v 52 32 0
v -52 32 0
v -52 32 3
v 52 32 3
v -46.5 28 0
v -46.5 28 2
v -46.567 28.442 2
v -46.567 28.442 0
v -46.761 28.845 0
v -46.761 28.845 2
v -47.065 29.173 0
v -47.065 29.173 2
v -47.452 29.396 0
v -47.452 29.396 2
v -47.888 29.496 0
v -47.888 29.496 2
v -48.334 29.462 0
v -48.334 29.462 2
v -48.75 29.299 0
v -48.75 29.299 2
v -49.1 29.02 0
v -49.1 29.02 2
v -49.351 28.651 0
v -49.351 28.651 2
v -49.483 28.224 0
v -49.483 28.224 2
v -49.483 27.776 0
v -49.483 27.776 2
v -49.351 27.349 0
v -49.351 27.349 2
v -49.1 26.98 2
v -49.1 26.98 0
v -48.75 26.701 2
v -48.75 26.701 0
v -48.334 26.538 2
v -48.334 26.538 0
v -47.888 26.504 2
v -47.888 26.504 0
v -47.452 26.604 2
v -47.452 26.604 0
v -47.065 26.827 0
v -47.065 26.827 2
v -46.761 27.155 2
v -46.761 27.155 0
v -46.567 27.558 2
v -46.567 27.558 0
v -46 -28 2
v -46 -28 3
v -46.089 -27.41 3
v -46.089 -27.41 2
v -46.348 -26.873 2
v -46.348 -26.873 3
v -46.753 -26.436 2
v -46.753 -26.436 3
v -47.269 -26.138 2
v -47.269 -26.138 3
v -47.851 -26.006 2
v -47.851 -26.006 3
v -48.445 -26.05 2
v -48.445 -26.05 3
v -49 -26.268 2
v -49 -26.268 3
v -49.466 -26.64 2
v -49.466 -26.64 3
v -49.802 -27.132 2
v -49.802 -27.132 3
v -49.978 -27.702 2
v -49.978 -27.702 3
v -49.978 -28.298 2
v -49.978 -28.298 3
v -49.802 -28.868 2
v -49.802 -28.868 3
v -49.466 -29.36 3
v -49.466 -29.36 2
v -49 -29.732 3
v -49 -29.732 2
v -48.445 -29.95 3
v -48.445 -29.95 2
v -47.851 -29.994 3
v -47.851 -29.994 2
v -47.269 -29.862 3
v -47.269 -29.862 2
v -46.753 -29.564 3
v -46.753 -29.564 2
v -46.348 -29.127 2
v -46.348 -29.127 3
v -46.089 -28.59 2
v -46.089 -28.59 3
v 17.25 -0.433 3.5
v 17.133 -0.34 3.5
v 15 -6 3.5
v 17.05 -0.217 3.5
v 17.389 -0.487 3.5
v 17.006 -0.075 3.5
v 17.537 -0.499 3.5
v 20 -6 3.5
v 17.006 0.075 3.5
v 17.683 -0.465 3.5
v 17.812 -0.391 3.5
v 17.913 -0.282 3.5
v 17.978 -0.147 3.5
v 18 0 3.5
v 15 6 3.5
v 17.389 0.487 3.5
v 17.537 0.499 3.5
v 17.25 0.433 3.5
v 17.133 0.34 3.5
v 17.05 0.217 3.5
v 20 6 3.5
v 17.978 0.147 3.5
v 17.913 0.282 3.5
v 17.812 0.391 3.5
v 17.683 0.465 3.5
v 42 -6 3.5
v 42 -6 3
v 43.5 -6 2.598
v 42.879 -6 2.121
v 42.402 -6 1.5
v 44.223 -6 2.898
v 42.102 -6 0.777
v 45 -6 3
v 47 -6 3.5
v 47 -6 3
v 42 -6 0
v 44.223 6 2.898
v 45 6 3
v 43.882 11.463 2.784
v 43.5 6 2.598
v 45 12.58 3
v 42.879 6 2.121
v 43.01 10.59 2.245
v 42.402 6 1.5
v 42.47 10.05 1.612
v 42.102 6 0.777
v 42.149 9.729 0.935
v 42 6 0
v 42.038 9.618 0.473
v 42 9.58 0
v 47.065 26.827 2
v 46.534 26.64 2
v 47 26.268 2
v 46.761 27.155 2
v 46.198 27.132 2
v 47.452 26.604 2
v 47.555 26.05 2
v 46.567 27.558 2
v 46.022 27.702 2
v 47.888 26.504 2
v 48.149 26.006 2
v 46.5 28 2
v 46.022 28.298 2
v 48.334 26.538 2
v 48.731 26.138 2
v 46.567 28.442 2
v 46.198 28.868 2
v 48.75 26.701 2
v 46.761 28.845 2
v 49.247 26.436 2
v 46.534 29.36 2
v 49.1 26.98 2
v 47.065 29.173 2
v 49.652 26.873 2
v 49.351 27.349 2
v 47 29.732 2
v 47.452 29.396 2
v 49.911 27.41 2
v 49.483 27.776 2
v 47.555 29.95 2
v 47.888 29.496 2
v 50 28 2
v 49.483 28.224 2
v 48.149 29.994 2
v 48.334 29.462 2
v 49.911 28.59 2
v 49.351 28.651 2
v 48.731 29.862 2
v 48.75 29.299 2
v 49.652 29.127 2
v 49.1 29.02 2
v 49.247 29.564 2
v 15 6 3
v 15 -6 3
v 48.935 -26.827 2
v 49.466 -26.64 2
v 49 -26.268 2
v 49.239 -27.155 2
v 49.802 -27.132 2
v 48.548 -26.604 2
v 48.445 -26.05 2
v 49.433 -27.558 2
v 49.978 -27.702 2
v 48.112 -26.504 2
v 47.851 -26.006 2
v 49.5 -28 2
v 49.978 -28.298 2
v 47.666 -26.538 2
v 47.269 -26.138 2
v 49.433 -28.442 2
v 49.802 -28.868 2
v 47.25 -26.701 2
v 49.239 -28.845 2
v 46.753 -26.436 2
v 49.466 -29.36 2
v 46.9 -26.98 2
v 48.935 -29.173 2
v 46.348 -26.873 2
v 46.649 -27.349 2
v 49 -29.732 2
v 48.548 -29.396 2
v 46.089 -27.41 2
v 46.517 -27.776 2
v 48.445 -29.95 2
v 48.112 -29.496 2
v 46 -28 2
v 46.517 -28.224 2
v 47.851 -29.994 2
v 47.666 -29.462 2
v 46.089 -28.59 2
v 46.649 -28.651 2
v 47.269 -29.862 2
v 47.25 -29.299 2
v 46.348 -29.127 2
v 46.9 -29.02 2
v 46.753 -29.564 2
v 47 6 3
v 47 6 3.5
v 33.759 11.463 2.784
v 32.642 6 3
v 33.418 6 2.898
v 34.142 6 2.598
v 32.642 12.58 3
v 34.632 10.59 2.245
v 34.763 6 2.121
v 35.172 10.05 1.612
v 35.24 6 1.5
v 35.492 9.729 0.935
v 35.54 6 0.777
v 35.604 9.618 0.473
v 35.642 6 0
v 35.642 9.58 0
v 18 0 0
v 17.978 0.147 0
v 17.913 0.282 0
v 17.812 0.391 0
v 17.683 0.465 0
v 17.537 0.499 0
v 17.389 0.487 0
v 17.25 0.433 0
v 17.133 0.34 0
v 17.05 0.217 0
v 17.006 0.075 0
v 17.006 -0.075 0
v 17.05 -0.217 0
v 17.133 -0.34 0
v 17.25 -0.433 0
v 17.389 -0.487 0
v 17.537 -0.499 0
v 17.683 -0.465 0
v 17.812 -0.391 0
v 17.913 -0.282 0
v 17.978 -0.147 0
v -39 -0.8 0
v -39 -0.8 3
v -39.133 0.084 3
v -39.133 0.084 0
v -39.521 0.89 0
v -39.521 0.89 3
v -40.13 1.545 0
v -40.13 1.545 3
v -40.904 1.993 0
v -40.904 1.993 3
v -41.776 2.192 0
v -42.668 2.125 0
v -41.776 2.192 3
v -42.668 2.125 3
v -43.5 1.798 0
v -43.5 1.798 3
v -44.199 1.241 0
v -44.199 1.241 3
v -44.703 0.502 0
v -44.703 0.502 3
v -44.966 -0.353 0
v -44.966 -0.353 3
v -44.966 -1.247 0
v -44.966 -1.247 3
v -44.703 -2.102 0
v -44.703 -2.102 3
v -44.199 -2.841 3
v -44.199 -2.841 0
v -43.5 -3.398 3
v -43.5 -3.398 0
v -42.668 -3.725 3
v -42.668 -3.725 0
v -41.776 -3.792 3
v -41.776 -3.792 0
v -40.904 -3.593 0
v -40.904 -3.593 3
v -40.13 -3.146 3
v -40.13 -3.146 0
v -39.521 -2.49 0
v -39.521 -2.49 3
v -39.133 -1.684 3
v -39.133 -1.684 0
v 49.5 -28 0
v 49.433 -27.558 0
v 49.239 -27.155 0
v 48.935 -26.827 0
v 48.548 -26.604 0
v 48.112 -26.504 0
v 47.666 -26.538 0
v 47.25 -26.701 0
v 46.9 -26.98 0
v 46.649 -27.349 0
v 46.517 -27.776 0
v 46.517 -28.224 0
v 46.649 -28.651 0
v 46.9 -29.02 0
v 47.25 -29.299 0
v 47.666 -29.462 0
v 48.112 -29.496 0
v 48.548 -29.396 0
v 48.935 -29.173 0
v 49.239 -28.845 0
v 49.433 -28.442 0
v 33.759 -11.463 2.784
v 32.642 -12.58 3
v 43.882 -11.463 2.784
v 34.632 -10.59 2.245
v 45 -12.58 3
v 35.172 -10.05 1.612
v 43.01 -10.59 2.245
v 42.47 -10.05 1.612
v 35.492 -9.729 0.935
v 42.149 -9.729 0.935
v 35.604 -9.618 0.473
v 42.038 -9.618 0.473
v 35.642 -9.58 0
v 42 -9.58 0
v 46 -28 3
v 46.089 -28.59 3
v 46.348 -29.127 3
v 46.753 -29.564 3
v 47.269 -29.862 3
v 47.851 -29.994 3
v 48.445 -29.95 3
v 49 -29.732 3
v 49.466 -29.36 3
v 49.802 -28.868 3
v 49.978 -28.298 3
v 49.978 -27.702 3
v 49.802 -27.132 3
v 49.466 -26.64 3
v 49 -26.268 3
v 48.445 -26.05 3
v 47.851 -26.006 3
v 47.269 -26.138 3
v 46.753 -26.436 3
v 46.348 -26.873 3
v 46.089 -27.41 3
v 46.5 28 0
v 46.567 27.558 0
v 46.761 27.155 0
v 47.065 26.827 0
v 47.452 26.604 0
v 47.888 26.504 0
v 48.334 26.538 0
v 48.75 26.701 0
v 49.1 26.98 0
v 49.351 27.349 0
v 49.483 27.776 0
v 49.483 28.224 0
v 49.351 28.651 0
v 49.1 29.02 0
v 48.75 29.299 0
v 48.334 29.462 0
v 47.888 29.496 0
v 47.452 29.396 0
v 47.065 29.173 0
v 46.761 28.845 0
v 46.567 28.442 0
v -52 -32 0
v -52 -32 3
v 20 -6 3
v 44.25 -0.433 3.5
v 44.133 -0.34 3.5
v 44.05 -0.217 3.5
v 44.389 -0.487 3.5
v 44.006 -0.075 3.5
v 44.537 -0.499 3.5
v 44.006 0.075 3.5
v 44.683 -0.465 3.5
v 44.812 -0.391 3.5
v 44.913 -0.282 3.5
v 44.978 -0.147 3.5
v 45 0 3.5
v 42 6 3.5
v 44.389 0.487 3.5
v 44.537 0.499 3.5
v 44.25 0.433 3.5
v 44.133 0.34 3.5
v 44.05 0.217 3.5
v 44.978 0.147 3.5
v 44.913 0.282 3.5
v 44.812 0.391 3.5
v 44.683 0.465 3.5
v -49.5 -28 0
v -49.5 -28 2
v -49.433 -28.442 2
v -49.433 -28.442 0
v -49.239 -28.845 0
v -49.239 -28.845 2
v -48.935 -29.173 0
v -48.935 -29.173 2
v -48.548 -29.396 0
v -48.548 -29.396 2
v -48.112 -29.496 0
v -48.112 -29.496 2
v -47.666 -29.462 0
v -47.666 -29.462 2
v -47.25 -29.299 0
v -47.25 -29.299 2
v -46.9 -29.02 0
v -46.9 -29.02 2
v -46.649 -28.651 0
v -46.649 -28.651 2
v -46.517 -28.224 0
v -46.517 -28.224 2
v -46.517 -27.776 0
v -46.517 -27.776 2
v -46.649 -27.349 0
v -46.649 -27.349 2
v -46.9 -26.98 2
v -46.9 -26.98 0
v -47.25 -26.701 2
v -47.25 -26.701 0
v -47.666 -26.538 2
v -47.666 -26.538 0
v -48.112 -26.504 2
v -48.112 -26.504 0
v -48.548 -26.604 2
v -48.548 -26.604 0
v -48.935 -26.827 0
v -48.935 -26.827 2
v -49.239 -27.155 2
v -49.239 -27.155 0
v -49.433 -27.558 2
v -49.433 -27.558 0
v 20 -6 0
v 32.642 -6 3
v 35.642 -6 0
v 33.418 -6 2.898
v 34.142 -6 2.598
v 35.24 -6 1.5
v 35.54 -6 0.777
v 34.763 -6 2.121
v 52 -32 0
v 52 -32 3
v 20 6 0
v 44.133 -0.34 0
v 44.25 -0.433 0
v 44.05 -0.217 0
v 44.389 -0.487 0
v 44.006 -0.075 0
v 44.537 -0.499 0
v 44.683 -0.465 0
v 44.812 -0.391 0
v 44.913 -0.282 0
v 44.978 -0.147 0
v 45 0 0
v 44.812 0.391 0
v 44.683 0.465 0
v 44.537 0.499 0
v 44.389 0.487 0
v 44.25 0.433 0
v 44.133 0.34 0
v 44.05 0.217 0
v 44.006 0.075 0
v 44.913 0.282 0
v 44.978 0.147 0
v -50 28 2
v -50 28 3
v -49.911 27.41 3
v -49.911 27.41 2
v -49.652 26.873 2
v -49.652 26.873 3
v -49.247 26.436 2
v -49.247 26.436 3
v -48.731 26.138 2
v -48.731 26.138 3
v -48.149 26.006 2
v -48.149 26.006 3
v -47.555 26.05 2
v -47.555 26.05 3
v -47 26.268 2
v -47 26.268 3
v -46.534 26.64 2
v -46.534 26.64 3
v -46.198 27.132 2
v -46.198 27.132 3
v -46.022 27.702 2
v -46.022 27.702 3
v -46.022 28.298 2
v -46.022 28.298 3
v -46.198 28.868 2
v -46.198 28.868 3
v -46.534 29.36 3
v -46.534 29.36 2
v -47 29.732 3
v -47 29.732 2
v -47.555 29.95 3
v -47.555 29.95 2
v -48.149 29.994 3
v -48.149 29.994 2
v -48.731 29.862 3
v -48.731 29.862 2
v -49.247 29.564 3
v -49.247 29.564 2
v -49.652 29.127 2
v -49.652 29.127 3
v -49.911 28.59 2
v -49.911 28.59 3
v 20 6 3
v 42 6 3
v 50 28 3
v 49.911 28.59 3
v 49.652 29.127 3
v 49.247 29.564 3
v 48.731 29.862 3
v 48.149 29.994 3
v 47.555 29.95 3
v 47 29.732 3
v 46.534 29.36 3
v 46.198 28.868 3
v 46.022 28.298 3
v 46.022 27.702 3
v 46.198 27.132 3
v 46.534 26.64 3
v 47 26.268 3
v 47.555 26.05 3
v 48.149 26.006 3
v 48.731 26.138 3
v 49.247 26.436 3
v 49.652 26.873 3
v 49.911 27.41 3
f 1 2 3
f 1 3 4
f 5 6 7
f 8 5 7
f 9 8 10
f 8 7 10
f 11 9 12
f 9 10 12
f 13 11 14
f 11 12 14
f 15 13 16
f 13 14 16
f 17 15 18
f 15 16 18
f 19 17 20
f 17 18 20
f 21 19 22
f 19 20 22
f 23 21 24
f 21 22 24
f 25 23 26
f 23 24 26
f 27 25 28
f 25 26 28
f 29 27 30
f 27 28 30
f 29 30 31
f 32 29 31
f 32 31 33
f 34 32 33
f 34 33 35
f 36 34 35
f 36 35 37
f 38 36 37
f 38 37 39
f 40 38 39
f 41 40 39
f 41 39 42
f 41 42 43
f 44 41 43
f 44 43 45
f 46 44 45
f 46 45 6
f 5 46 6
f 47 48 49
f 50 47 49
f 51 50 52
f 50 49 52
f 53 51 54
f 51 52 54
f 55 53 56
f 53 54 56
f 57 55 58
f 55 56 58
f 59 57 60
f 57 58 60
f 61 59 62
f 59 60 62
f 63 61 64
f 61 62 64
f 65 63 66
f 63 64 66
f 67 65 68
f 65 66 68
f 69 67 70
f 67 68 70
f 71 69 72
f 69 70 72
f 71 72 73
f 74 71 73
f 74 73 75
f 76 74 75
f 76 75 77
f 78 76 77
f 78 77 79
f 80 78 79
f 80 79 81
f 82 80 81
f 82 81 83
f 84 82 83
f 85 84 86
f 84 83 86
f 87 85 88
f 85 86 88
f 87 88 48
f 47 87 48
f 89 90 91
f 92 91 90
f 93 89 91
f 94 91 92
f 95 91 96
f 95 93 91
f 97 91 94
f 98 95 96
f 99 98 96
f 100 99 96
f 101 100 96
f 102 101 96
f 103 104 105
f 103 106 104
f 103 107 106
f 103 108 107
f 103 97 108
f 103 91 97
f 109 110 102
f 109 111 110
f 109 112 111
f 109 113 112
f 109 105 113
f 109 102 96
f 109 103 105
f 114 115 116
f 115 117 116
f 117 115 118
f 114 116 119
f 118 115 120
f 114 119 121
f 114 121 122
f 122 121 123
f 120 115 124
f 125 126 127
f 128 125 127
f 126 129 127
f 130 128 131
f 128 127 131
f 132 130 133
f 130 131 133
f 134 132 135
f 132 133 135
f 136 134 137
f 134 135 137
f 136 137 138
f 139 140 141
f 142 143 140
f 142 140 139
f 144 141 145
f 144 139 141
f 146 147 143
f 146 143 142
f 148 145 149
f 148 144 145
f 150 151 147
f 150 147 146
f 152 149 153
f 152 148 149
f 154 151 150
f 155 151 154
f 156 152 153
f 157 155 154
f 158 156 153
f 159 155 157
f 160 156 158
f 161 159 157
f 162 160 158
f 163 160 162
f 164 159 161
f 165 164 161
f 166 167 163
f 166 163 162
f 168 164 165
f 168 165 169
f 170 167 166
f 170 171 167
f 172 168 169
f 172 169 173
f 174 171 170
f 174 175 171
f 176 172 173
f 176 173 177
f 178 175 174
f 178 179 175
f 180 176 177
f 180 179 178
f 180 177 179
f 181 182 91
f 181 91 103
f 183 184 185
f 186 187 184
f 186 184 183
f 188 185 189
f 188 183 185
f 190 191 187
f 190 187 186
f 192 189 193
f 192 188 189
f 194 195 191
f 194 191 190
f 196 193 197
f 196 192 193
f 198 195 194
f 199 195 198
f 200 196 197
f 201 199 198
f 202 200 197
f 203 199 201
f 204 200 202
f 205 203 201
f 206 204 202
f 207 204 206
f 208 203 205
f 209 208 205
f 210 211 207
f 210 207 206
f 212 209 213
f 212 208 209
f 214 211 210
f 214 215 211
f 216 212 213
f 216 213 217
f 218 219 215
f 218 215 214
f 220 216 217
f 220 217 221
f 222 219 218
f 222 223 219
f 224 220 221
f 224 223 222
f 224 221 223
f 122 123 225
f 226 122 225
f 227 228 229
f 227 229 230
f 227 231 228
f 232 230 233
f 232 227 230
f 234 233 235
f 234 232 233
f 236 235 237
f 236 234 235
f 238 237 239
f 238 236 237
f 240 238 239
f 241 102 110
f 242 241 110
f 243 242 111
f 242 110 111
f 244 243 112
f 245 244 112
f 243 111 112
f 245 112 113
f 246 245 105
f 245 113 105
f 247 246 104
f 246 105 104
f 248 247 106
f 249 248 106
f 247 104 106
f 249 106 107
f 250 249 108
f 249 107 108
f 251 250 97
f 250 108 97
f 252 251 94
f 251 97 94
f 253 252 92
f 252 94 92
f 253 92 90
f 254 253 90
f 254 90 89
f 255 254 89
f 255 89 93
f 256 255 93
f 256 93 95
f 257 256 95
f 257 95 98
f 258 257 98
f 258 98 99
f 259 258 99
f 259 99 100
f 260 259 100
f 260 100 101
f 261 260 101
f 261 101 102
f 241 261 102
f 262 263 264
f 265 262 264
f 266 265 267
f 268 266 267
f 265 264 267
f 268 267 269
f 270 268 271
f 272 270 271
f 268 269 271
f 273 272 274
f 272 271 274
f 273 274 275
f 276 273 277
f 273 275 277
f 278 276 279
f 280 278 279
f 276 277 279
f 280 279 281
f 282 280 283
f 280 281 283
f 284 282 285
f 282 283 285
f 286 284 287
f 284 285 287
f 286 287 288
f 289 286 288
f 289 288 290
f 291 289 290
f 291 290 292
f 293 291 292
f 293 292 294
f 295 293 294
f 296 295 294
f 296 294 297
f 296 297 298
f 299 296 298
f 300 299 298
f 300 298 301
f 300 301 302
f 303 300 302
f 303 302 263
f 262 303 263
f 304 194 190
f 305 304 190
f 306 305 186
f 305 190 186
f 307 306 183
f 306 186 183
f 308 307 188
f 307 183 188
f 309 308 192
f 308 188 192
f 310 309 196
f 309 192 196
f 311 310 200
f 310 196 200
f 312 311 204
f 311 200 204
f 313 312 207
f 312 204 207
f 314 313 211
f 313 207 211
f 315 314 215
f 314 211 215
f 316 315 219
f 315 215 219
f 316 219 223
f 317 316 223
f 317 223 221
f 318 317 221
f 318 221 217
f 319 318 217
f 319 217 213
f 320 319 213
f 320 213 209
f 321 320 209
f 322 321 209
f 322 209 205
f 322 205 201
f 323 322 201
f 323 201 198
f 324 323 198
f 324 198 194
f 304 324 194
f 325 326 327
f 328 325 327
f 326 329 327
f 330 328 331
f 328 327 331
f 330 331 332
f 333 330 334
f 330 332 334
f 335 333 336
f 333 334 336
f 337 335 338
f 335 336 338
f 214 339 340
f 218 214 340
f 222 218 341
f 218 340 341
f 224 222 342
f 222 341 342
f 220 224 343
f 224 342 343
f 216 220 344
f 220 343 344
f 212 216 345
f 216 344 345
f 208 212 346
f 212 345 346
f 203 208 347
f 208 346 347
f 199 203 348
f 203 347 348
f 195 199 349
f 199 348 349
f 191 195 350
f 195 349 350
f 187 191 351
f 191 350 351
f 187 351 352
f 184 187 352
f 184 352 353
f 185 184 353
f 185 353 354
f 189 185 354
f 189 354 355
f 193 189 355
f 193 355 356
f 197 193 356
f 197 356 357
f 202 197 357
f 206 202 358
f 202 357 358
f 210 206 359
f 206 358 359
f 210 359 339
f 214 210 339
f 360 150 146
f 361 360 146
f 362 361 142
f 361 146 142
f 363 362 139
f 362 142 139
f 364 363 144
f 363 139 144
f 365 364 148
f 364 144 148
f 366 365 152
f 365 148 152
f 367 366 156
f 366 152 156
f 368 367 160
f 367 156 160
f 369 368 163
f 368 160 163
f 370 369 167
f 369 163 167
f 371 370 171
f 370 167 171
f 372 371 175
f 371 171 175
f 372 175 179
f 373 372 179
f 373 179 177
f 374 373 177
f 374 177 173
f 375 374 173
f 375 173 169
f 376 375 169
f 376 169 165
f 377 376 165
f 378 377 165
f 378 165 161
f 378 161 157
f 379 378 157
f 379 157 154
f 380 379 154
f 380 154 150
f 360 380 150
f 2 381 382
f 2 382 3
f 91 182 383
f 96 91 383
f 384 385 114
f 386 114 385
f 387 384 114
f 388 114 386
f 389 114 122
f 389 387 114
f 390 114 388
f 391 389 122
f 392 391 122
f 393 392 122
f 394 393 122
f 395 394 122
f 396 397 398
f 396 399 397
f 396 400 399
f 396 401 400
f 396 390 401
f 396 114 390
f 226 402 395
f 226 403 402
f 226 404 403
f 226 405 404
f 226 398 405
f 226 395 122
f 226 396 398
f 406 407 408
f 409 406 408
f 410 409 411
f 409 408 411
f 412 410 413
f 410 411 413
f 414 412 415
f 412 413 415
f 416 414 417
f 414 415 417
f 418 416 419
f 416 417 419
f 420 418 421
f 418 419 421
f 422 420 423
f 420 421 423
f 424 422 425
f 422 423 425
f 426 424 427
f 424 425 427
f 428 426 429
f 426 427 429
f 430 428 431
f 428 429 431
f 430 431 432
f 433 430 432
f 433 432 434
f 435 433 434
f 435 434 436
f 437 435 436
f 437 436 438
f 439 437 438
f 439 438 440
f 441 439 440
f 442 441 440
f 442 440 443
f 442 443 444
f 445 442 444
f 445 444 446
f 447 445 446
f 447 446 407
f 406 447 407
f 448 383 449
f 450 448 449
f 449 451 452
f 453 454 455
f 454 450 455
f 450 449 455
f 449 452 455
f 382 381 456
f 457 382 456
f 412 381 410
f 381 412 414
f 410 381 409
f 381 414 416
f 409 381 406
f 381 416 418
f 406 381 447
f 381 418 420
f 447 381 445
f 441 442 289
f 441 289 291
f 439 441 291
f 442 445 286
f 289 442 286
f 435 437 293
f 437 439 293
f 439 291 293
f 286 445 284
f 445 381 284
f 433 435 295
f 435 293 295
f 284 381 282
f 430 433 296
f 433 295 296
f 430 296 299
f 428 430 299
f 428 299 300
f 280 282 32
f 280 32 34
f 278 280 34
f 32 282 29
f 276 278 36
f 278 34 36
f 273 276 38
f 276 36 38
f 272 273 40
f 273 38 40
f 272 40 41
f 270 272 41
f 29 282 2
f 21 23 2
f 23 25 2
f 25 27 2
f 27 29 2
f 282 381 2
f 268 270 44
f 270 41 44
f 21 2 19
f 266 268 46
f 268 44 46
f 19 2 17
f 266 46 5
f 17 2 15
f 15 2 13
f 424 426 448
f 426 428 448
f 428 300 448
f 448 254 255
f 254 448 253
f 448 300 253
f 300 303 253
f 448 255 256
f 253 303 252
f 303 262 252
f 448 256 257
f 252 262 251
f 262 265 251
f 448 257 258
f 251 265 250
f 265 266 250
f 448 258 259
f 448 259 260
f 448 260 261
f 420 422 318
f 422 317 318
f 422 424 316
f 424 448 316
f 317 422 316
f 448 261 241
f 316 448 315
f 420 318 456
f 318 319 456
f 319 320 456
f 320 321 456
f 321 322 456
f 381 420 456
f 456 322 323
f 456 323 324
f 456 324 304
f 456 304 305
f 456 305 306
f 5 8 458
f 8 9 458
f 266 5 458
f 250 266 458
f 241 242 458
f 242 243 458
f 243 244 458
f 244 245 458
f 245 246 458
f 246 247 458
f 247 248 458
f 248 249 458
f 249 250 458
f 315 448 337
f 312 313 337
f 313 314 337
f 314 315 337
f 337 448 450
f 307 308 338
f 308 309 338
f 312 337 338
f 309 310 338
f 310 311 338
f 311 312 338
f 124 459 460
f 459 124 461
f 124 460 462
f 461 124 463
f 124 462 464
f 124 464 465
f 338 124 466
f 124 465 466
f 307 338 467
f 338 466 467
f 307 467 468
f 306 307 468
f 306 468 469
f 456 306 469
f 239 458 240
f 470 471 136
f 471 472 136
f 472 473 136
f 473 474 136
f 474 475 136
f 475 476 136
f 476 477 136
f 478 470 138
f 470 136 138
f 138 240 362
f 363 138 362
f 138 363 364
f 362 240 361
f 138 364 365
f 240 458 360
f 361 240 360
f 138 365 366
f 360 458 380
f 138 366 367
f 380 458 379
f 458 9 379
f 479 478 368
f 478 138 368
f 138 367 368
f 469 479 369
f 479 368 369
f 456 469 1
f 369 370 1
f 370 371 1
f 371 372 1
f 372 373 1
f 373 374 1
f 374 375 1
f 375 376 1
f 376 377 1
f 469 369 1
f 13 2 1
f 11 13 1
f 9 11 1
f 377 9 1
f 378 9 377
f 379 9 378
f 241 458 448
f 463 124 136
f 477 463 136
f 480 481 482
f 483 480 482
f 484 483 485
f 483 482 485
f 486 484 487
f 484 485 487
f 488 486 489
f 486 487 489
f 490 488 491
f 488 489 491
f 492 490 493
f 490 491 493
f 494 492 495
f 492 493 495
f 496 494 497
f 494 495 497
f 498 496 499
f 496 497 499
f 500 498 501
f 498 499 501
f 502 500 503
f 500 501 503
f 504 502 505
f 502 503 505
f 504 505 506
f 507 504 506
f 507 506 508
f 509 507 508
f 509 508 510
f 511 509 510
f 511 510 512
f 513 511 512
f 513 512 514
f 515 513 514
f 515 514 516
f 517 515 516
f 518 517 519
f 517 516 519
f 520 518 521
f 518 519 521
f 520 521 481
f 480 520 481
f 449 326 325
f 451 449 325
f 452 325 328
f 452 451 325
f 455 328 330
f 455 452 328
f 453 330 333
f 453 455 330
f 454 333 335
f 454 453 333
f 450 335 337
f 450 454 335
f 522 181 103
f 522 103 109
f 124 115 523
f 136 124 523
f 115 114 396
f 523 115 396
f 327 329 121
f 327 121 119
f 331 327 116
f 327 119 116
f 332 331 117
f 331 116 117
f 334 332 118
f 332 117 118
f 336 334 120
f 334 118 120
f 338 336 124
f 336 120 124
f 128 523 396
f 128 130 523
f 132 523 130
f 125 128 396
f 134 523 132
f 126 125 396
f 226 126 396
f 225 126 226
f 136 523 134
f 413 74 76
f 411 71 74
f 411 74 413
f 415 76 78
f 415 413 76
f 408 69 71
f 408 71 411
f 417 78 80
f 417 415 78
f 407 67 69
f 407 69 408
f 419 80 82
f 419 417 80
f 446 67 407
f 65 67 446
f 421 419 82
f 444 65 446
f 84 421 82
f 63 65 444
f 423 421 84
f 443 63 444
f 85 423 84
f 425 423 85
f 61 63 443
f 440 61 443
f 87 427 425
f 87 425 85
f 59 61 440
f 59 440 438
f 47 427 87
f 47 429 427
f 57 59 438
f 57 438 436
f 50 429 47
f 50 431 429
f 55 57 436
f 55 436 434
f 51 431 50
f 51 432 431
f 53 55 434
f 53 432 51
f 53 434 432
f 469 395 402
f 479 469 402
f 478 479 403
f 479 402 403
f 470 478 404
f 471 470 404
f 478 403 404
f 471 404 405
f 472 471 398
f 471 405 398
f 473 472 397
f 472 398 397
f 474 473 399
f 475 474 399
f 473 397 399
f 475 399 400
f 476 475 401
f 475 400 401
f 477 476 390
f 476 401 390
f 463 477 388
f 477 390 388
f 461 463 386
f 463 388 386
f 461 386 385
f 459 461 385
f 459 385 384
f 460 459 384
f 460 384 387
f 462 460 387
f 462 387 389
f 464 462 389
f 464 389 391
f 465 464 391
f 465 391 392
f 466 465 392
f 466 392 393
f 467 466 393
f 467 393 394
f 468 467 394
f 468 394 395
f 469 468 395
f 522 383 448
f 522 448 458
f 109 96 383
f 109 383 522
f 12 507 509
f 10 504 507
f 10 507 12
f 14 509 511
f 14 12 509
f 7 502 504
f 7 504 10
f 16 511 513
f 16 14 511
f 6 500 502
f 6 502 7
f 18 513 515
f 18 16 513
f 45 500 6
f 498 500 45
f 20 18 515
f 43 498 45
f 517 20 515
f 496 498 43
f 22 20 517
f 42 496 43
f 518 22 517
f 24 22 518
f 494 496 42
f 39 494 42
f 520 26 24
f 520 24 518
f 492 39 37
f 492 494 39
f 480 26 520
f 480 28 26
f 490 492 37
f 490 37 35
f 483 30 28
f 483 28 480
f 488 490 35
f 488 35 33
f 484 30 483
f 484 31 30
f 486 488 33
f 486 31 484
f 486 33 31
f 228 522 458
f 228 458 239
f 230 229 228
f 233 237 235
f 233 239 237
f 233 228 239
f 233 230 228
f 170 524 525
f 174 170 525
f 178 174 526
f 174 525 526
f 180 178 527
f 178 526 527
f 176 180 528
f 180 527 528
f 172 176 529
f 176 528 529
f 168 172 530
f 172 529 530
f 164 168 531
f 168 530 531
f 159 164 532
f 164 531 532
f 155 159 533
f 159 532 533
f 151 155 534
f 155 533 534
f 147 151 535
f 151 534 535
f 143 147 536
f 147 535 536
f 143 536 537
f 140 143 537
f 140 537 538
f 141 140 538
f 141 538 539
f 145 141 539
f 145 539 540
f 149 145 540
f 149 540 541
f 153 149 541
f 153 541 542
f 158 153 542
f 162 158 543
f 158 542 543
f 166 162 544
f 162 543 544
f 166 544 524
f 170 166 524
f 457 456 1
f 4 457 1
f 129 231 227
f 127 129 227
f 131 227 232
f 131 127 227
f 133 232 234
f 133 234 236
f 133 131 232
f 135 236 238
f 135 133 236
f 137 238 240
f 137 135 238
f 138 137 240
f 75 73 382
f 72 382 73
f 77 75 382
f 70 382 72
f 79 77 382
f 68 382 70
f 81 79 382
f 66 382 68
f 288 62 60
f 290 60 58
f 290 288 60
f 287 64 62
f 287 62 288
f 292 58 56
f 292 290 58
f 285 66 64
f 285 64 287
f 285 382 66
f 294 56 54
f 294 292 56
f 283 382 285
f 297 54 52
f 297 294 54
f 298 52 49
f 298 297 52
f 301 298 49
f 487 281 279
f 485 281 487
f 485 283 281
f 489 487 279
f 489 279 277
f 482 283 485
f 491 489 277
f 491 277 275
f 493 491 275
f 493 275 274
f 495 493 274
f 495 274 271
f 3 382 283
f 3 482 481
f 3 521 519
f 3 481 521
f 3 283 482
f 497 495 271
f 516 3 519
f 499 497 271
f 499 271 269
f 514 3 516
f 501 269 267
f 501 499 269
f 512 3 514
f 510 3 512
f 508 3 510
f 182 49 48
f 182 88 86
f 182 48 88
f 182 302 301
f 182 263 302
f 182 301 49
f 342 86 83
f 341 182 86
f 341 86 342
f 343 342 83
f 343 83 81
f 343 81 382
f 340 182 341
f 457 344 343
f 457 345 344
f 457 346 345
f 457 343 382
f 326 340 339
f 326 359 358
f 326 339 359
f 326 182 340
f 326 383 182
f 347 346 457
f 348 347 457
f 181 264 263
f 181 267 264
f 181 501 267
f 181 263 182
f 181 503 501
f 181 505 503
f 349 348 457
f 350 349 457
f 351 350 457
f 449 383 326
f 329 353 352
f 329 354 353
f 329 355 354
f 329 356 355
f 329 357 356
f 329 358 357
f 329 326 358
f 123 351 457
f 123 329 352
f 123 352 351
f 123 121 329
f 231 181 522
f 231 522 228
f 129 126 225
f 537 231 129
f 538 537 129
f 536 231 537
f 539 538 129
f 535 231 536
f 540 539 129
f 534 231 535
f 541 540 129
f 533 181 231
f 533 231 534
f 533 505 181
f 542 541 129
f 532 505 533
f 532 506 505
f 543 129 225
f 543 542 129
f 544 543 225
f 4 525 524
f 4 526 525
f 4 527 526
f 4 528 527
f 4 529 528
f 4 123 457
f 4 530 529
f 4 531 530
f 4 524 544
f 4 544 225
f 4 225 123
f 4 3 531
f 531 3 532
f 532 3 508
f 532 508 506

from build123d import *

# Parameters (mm, degrees)
SKETCH_1_W           = 104
SKETCH_1_H           = 64
EXTRUDE_1_DEPTH      = 3
SKETCH_2_R           = 1.5
CUT_EXTRUDE_1_DEPTH  = 62.131006862
SKETCH_4_R           = 2
CUT_EXTRUDE_3_DEPTH  = 1
SKETCH_12_W          = 5
SKETCH_12_H          = 12
EXTRUDE_4_DEPTH      = 0.5
SKETCH_13_R          = 0.5
CUT_EXTRUDE_8_DEPTH  = 62.15758334
SKETCH_15_W          = 22
SKETCH_15_H          = 12
CUT_EXTRUDE_10_DEPTH = 62.131006862
SKETCH_17_W          = 6.358168499
SKETCH_17_H          = 19.16029301
CUT_EXTRUDE_11_DEPTH = 4
FILLET_2_R           = 3
SKETCH_18_R          = 3
CUT_EXTRUDE_12_DEPTH = 6


with BuildPart() as part:
    # 草图1 → 凸台-拉伸1 (new body)
    with BuildSketch(Plane.XY):
        Rectangle(SKETCH_1_W, SKETCH_1_H)
    extrude(amount=EXTRUDE_1_DEPTH)

    # 草图2 → 切除-拉伸1 (cut, through all)
    with BuildSketch(Plane.XY.offset(3)):
        with Locations((-48, 28)):
            Circle(SKETCH_2_R)
        with Locations(Location((48, 28, 0), (0, 0, 180))):
            Circle(SKETCH_2_R)
        with Locations((48, -28)):
            Circle(SKETCH_2_R)
        with Locations(Location((-48, -28, 0), (0, 0, 180))):
            Circle(SKETCH_2_R)
    extrude(amount=-CUT_EXTRUDE_1_DEPTH, mode=Mode.SUBTRACT)

    # 草图4 → 切除-拉伸3 (cut)
    with BuildSketch(Plane.XY.offset(3)):
        with Locations((48, 28)):
            Circle(SKETCH_4_R)
        with Locations(Location((-48, 28, 0), (0, 0, 180))):
            Circle(SKETCH_4_R)
        with Locations((-48, -28)):
            Circle(SKETCH_4_R)
        with Locations(Location((48, -28, 0), (0, 0, 180))):
            Circle(SKETCH_4_R)
    extrude(amount=-CUT_EXTRUDE_3_DEPTH, mode=Mode.SUBTRACT)

    # 草图12 → 凸台-拉伸4 (add)
    with BuildSketch(Plane.XY.offset(3)):
        with Locations((17.5, 0)):
            Rectangle(SKETCH_12_W, SKETCH_12_H)
        with Locations((44.5, 0)):
            Rectangle(SKETCH_12_W, SKETCH_12_H)
    extrude(amount=EXTRUDE_4_DEPTH)

    # 草图13 → 切除-拉伸8 (cut, through all)
    with BuildSketch(Plane.XY.offset(3.5)):
        with Locations((17.5, 0)):
            Circle(SKETCH_13_R)
        with Locations((44.5, 0)):
            Circle(SKETCH_13_R)
    extrude(amount=-CUT_EXTRUDE_8_DEPTH, mode=Mode.SUBTRACT)

    # 草图15 → 切除-拉伸10 (cut, through all)
    with BuildSketch(Plane.XY.offset(3)):
        with Locations((31, 0)):
            Rectangle(SKETCH_15_W, SKETCH_15_H)
    extrude(amount=-CUT_EXTRUDE_10_DEPTH, mode=Mode.SUBTRACT)

    # 草图17 → 切除-拉伸11 (cut)
    with BuildSketch(Plane.XY.offset(3)):
        with Locations((38.820915751, 0)):
            Rectangle(SKETCH_17_W, SKETCH_17_H)
    extrude(amount=-CUT_EXTRUDE_11_DEPTH, mode=Mode.SUBTRACT)

    # 圆角2
    fillet_2_edges = [part.edges().sort_by_distance(p)[0] for p in [
        (35.641831501, -7.790073253, 3),
        (38.82091575, -9.580146505, 3),
        (42, -7.790073253, 3),
        (42, 7.790073253, 3),
        (38.82091575, 9.580146505, 3),
        (35.641831501, 7.790073253, 3),
    ]]
    fillet(fillet_2_edges, radius=FILLET_2_R - 0.0001)  # a hair under: the kernel refuses the full size

    # 草图18 → 切除-拉伸12 (cut)
    with BuildSketch(Plane.XY.offset(3)):
        with Locations((-42, -0.800014708)):
            Circle(SKETCH_18_R)
    extrude(amount=-CUT_EXTRUDE_12_DEPTH, mode=Mode.SUBTRACT)


solid = part.part
